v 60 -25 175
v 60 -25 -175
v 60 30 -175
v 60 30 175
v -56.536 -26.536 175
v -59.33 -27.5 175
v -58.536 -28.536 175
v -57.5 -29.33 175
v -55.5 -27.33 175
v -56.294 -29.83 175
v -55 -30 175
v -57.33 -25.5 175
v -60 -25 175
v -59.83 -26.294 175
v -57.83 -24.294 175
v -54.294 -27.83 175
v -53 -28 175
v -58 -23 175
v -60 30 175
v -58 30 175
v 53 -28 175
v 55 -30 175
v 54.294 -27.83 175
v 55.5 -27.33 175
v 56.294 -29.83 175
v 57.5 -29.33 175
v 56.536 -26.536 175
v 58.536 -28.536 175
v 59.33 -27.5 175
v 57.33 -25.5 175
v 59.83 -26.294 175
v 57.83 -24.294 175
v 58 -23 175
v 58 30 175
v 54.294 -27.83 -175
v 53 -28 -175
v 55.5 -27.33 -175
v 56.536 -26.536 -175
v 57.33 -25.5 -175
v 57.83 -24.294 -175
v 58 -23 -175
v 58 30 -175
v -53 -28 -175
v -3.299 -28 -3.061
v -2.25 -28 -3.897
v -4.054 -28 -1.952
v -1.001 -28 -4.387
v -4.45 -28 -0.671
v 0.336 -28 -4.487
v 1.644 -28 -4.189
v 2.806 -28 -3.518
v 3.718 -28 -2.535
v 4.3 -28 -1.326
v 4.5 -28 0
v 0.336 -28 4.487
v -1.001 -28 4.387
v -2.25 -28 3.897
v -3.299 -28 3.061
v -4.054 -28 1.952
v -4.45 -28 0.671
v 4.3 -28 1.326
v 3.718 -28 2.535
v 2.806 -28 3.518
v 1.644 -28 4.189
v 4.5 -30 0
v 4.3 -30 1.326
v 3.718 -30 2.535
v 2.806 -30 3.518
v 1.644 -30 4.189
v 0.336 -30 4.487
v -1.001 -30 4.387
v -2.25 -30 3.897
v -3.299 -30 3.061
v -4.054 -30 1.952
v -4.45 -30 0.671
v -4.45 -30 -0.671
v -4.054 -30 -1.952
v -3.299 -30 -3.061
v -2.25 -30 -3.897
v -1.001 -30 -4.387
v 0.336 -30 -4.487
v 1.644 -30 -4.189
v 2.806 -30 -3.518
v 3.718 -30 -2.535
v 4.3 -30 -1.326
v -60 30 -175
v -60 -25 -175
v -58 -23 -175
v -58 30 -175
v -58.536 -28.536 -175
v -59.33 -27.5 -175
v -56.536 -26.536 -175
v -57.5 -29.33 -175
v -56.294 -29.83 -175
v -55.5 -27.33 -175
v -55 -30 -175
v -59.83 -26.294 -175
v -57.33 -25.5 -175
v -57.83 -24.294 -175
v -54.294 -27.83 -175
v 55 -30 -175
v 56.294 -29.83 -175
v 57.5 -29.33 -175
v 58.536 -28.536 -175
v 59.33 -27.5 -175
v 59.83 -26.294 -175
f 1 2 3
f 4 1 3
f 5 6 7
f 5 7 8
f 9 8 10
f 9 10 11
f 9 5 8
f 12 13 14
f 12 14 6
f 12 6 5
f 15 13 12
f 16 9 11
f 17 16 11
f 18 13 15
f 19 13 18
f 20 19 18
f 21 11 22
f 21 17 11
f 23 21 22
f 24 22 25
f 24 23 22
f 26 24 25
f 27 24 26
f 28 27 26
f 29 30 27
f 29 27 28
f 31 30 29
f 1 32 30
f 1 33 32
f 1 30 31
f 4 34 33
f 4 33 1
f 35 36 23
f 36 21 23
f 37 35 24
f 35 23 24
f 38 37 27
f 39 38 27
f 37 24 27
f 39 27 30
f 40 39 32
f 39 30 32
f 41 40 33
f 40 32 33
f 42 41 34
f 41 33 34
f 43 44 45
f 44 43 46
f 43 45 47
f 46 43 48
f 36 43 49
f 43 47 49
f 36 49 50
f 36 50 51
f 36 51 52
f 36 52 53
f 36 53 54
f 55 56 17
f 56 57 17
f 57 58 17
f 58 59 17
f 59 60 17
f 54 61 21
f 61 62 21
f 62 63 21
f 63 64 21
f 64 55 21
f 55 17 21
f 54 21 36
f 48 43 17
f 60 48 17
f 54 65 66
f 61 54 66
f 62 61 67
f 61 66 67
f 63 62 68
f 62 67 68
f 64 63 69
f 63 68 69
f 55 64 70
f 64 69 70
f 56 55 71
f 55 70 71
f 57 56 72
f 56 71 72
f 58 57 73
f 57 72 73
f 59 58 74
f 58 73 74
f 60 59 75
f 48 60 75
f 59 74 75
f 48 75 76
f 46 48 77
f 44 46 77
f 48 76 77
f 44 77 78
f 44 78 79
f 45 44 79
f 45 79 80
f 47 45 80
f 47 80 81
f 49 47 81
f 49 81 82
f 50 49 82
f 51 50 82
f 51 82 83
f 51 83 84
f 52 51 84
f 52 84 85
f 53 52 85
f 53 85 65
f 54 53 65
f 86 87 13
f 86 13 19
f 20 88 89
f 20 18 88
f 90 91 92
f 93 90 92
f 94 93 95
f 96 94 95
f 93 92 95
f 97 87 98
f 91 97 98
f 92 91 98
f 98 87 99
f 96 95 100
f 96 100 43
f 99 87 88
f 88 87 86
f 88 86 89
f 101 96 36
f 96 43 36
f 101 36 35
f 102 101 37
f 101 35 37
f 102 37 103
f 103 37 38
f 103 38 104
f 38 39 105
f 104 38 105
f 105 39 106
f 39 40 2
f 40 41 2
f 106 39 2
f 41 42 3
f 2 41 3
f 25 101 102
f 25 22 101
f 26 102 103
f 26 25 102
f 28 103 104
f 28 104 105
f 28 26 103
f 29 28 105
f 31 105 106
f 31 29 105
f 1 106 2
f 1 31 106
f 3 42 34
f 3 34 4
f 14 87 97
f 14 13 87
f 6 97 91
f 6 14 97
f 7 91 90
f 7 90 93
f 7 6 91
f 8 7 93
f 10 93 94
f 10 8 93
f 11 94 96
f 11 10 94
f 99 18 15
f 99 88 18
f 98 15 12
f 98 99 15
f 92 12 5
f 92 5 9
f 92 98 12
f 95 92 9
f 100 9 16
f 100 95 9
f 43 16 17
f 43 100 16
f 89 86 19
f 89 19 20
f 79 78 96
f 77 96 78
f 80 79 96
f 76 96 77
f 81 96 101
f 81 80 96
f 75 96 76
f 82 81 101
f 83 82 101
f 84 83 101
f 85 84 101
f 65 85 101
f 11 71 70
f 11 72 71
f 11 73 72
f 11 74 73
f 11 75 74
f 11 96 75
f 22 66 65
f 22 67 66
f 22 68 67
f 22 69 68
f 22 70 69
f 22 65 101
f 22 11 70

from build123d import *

# Parameters (mm, degrees)
F0_W     = 120
F0_H     = 60
F1_DEPTH = 175
F2_T     = -2
F3_R     = 5
F4_R     = 4.5
F5_DEPTH = 60.001


with BuildPart() as f1:
    # F0 (on Top) → F1 (new body, symmetric)
    with BuildSketch(Plane.XY):
        Rectangle(F0_W, F0_H)
    extrude(amount=F1_DEPTH, both=True)

    # F2
    f2_openings = [f1.faces().sort_by_distance(p)[0] for p in [
        (0, 30, 0),
        (0, 0, 175),
        (0, 0, -175),
    ]]
    offset(amount=F2_T, openings=f2_openings)

    # F3
    f3_edges = [f1.edges().sort_by_distance(p)[0] for p in [
        (60, -30, 0),
        (-58, -28, 0),
        (58, -28, 0),
        (-60, -30, 0),
    ]]
    fillet(f3_edges, radius=F3_R)

    # F4 (on face) → F5 (cut, through all)
    with BuildSketch(Plane.XZ.offset(30)):
        Circle(F4_R)
    extrude(amount=-F5_DEPTH, mode=Mode.SUBTRACT)


solid = f1.part
